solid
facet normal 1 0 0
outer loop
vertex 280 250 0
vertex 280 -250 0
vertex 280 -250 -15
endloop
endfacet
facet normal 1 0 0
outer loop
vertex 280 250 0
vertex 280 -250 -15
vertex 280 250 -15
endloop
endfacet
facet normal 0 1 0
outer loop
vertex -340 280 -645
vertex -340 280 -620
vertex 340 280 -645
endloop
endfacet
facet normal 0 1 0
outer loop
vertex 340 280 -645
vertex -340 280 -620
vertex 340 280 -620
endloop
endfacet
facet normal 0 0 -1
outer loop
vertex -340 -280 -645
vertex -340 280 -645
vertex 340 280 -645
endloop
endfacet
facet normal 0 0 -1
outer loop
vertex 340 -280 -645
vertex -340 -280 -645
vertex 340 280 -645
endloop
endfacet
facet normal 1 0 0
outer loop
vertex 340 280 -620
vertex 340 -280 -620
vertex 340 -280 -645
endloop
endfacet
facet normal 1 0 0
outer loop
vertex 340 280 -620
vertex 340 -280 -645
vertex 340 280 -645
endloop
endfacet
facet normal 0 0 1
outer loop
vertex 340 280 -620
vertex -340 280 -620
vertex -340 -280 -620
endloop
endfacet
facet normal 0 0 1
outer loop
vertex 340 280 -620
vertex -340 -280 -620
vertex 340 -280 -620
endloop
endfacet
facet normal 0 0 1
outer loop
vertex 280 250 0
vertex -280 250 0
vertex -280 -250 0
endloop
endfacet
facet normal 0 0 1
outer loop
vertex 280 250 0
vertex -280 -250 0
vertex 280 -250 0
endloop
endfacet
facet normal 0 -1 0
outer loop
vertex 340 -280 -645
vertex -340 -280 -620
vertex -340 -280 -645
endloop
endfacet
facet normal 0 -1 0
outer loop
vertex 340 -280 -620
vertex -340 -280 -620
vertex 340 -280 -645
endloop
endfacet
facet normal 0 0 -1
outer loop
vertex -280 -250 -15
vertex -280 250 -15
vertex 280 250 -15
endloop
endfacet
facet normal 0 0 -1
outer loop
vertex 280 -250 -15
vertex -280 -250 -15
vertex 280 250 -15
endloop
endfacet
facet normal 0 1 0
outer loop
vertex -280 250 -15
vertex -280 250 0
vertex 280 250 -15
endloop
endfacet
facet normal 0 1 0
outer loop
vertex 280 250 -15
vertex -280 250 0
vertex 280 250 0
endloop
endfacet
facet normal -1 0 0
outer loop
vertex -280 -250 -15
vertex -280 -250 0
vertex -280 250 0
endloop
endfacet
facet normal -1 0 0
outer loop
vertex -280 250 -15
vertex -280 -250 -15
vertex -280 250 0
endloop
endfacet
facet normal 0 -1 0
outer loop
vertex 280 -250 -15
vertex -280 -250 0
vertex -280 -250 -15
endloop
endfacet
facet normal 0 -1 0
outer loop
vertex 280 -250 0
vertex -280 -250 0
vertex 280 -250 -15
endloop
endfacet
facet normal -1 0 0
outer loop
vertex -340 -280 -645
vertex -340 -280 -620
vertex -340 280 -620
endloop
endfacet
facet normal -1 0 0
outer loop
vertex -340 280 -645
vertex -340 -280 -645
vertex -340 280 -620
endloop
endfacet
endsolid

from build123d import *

# Parameters (mm, degrees)
SKETCH_6_W             = 560
SKETCH_6_H             = 500
EXTRUDE_312_DEPTH      = 15
SKETCH_7_W             = 680
SKETCH_7_H             = 560
EXTRUDE_428_DEPTH      = 5
EXTRUDE_428_DEPTH_BACK = 20


with BuildPart() as part:
    # Эскиз6 → Extrude 312 (new body)
    with BuildSketch(Plane.XY):
        Rectangle(SKETCH_6_W, SKETCH_6_H)
    extrude(amount=-EXTRUDE_312_DEPTH)


with BuildPart() as body_2:
    # Эскиз7 → Extrude 428 (new body, two sides)
    with BuildSketch(Plane.XY.offset(-625)) as extrude_428_sk:
        Rectangle(SKETCH_7_W, SKETCH_7_H)
    extrude(amount=EXTRUDE_428_DEPTH)
    extrude(extrude_428_sk.sketch, amount=-EXTRUDE_428_DEPTH_BACK)


solid = Compound([part.part, body_2.part])
